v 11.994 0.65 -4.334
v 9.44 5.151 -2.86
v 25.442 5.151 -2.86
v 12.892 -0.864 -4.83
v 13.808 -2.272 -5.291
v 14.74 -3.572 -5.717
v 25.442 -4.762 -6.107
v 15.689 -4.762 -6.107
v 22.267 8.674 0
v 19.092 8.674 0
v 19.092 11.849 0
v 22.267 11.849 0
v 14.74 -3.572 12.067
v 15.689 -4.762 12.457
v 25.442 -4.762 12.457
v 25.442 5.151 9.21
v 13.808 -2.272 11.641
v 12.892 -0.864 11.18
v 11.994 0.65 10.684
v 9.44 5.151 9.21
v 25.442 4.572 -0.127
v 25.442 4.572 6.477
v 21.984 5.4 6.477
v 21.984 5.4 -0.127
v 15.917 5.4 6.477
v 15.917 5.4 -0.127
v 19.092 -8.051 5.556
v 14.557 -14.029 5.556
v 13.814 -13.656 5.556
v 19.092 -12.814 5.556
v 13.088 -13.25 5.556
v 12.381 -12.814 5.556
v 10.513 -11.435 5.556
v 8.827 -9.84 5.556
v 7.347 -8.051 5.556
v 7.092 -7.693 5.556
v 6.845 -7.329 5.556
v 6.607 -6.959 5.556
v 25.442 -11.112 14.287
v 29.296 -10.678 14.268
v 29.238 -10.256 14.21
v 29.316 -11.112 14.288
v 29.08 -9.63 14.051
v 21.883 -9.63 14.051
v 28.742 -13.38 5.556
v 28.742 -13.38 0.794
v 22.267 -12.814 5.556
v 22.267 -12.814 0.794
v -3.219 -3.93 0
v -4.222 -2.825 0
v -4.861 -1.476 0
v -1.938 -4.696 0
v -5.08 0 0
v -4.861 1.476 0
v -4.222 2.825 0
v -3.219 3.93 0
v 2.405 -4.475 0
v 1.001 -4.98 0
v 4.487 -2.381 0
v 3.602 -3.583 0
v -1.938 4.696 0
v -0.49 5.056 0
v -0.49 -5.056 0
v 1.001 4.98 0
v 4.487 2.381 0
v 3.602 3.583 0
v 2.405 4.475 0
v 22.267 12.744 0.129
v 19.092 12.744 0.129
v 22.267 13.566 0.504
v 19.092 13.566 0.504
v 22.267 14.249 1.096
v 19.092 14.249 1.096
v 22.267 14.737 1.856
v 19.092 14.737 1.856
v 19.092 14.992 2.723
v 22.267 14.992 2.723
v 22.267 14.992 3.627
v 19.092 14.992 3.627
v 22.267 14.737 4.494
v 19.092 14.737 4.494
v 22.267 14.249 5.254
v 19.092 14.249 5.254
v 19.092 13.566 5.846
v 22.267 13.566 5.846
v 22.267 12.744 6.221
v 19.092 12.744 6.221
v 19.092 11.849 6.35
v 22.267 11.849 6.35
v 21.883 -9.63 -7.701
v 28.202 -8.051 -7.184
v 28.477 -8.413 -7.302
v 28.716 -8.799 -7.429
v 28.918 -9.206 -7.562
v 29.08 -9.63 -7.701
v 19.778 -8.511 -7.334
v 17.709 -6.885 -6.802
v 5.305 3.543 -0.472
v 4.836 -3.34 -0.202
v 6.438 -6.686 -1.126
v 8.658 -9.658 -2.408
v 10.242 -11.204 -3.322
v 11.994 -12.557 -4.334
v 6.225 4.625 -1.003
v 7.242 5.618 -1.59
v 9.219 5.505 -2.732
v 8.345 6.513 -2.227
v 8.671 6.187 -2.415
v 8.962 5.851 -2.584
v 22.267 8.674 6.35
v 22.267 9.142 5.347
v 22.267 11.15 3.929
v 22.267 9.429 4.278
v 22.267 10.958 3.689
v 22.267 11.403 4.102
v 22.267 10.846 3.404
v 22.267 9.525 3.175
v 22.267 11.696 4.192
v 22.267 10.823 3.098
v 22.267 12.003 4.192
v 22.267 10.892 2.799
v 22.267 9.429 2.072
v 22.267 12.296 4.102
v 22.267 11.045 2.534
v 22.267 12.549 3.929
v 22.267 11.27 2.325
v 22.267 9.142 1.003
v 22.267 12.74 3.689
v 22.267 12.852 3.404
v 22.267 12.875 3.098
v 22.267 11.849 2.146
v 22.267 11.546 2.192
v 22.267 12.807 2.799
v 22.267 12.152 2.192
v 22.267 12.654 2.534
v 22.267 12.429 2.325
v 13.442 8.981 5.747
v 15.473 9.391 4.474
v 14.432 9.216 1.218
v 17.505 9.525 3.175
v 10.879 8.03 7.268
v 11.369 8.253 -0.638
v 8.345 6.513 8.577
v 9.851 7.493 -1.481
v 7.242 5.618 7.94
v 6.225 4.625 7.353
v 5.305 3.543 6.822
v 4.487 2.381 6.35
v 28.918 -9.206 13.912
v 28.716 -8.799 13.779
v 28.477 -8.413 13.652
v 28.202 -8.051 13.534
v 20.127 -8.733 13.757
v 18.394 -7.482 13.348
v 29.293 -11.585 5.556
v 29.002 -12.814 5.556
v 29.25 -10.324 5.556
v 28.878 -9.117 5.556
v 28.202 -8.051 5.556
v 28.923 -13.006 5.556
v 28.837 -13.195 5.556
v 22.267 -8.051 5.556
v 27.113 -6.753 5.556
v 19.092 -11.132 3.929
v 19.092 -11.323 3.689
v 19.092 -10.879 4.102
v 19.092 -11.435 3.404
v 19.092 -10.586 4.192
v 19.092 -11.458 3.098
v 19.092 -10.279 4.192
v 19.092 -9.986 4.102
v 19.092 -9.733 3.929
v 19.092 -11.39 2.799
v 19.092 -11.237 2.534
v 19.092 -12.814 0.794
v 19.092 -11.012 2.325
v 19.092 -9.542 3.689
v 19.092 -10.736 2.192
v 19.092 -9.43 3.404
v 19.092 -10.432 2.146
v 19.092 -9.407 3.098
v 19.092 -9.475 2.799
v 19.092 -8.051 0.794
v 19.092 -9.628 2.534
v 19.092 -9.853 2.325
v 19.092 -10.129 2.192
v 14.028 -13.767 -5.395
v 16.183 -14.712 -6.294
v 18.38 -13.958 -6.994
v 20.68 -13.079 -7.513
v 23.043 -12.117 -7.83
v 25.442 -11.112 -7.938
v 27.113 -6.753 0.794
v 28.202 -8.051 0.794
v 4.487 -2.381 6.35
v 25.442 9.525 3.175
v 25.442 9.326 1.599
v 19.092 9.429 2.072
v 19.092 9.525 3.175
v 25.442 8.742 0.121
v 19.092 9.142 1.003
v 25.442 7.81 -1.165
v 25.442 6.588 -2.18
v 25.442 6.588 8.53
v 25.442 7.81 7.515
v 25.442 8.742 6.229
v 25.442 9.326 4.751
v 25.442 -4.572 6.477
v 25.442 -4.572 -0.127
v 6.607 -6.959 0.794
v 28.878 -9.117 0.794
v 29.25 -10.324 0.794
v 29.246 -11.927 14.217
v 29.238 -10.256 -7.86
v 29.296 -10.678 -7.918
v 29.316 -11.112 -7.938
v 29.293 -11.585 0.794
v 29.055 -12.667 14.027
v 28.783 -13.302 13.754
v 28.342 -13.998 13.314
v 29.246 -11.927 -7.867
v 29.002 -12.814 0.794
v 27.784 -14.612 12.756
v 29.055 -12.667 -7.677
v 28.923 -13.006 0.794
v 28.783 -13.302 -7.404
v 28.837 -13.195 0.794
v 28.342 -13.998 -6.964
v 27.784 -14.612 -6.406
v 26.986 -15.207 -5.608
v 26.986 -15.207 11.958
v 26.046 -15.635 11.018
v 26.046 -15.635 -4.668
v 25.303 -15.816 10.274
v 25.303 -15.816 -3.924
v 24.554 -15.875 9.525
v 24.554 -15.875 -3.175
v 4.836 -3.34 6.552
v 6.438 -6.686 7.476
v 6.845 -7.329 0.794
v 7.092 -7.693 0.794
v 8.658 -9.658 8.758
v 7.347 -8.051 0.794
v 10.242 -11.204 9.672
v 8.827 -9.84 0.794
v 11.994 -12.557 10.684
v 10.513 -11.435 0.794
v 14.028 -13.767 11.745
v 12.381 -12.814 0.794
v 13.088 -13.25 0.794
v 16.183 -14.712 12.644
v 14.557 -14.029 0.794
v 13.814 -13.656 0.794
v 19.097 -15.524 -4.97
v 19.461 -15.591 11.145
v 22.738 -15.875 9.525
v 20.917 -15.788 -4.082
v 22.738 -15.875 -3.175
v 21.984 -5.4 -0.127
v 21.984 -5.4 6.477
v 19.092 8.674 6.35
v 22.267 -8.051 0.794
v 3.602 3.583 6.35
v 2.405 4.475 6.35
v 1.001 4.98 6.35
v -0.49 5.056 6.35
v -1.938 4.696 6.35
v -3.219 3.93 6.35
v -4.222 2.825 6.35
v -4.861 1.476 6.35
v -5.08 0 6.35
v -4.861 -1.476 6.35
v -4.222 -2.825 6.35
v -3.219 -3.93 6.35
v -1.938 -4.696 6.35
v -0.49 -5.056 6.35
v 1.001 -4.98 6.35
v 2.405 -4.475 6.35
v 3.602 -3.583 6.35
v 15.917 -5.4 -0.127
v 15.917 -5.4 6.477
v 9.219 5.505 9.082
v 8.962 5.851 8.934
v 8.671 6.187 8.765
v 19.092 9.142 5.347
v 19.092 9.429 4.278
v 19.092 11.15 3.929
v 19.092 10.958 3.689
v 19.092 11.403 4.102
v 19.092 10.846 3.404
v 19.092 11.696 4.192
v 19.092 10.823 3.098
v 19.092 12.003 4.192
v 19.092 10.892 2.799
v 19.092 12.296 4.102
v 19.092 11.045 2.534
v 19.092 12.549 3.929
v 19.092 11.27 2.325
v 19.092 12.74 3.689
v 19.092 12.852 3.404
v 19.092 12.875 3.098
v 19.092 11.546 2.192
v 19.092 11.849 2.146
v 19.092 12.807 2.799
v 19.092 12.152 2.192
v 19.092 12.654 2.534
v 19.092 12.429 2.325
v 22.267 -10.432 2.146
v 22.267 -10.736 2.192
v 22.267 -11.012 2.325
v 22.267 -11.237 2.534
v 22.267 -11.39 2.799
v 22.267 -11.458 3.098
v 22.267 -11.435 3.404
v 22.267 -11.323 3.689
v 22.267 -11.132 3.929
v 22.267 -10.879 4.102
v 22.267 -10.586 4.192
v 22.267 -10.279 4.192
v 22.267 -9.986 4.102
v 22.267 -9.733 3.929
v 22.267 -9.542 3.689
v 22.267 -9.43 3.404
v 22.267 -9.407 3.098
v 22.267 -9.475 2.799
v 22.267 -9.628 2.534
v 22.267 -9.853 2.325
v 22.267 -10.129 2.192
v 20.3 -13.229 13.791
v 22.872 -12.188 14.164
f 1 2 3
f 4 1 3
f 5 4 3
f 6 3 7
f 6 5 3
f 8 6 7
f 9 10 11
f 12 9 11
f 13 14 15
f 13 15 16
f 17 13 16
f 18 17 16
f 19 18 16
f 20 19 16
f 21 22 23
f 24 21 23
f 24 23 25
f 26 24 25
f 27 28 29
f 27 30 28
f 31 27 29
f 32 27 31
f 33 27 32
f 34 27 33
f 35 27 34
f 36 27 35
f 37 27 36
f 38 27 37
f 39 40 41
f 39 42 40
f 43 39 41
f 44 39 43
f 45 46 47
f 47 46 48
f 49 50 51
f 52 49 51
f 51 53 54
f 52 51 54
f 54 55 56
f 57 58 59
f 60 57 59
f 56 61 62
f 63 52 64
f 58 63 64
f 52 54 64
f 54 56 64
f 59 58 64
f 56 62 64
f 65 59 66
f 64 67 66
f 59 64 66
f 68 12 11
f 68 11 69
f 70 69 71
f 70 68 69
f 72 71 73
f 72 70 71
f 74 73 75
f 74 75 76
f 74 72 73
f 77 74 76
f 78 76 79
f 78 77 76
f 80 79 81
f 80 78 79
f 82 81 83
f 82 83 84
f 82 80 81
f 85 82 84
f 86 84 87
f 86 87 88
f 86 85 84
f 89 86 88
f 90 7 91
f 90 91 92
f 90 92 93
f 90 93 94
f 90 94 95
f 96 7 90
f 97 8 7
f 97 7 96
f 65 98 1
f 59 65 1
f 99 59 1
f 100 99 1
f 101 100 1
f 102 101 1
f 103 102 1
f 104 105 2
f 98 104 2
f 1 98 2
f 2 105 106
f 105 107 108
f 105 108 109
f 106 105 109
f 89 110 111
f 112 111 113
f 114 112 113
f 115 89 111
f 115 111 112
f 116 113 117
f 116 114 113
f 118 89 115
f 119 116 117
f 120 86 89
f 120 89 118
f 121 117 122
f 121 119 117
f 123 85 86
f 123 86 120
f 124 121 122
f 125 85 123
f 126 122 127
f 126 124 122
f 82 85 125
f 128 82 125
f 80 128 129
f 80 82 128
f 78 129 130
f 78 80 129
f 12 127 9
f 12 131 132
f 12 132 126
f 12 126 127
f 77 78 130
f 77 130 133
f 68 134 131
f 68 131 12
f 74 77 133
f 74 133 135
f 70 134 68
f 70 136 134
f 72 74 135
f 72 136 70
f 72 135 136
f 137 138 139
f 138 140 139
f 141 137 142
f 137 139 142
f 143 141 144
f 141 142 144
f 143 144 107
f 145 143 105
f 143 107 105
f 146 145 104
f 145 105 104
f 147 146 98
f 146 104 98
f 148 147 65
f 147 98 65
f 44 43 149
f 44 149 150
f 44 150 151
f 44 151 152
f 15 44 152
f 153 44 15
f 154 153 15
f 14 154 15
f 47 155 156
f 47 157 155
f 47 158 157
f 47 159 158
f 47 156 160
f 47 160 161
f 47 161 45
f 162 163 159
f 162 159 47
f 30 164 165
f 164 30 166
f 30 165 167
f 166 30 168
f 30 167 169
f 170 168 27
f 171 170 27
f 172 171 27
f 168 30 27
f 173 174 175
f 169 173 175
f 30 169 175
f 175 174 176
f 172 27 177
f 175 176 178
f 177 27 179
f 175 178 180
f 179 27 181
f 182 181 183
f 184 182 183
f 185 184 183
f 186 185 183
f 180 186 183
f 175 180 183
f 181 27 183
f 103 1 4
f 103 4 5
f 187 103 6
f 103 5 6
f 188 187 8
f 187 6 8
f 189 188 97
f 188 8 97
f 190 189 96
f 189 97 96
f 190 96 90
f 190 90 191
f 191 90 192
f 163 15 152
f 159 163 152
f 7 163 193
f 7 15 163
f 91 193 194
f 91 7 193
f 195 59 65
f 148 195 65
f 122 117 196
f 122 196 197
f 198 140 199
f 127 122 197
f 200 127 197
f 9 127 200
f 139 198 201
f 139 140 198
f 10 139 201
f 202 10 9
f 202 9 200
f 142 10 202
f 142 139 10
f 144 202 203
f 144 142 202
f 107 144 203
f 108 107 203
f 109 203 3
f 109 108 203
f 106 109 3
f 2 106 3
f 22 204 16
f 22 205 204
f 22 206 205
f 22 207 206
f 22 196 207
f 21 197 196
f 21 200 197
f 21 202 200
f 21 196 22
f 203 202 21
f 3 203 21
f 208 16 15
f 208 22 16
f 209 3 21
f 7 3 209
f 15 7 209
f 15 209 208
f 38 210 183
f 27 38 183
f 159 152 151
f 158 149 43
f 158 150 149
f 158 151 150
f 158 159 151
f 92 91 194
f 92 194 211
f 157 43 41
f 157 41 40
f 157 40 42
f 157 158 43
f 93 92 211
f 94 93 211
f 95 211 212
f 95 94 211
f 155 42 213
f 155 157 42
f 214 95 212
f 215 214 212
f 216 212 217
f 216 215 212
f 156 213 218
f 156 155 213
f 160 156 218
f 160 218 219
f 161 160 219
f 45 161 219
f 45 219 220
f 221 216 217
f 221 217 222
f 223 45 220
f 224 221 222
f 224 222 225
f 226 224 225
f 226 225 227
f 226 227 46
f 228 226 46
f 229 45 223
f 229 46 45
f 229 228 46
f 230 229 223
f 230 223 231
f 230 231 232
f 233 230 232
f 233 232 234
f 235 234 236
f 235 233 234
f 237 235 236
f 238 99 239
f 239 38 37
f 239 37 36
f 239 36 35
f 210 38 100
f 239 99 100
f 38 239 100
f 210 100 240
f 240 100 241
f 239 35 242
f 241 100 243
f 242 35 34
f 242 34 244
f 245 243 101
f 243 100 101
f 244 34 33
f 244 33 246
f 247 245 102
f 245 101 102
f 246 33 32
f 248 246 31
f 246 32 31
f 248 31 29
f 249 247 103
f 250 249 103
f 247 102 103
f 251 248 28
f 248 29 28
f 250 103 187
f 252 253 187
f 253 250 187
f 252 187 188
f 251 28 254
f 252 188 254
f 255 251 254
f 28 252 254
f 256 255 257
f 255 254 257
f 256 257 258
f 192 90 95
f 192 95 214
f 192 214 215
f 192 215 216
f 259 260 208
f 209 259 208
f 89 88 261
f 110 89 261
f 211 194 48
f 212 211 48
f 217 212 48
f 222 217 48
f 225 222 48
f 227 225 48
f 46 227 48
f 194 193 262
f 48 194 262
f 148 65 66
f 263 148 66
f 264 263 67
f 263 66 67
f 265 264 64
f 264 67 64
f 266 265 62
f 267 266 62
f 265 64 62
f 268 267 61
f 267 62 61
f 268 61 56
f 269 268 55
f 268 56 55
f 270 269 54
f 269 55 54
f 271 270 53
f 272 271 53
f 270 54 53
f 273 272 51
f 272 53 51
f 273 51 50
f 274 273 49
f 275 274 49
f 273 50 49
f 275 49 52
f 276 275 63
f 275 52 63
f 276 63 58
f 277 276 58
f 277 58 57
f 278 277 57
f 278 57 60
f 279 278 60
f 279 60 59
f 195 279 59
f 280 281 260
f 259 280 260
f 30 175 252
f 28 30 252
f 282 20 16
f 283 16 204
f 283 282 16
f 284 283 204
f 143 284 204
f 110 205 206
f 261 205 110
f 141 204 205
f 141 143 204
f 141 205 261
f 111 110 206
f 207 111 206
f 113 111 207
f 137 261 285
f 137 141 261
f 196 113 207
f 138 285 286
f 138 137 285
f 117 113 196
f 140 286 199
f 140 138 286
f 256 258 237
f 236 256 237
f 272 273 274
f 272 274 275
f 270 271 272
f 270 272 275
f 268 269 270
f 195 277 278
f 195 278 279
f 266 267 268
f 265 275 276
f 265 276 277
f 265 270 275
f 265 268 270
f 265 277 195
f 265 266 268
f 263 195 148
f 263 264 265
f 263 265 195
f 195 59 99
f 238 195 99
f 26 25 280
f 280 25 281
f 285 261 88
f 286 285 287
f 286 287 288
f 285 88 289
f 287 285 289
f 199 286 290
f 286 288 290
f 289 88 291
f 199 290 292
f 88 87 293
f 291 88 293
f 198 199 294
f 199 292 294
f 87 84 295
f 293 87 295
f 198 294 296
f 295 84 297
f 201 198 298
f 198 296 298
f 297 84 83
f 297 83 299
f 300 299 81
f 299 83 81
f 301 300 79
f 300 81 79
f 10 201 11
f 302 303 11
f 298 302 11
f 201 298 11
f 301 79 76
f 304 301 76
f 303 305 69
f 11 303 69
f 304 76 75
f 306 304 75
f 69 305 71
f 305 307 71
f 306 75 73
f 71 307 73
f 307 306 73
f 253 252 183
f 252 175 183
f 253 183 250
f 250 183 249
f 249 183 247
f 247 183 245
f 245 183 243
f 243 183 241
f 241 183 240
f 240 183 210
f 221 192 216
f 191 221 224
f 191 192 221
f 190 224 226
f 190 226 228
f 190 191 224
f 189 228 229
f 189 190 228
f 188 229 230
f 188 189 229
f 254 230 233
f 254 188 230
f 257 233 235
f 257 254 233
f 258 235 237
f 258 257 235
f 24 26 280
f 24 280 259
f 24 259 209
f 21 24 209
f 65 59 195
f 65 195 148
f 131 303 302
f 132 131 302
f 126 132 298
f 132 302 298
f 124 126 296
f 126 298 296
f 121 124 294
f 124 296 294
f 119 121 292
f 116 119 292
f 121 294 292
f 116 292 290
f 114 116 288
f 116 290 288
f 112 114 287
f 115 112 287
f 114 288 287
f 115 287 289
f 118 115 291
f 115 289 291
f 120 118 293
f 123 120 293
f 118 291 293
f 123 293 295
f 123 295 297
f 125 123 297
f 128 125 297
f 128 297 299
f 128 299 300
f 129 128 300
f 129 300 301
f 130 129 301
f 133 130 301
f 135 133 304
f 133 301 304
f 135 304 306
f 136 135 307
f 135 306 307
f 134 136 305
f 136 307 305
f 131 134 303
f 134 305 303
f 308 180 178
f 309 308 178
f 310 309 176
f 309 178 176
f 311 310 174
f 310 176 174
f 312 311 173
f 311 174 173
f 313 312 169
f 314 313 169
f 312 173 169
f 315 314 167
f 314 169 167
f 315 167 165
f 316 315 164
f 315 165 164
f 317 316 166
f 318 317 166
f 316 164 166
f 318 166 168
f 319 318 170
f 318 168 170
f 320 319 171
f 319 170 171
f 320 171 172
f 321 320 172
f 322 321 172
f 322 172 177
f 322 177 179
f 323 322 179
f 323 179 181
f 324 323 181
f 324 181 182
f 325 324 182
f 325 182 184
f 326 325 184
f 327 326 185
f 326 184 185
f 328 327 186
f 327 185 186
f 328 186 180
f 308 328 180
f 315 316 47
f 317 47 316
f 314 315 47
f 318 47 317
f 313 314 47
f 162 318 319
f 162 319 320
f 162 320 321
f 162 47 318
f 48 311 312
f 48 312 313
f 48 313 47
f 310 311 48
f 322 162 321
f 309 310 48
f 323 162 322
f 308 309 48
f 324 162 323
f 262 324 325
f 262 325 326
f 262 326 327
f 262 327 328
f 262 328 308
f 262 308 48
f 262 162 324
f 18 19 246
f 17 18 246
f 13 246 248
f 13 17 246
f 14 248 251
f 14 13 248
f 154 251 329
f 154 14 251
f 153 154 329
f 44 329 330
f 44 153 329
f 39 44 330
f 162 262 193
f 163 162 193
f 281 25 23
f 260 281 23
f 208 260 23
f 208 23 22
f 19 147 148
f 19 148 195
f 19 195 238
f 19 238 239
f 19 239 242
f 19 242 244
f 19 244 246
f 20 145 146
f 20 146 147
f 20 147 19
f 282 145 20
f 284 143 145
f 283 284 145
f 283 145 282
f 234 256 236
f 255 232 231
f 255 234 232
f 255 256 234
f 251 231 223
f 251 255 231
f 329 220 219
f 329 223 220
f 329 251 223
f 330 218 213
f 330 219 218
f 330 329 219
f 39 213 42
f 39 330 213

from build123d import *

# Parameters (mm, degrees)
BOSS_EXTRUDE1_DEPTH      = 6.35
BOSS_EXTRUDE2_START      = -7.9375
BOSS_EXTRUDE2_DEPTH      = 22.225
CUT_EXTRUDE1_DEPTH       = 46.365450693
CUT_EXTRUDE2_START       = -7.9375
CUT_EXTRUDE2_DEPTH       = 25.24
CUT_EXTRUDE7_DEPTH       = 10
CUT_EXTRUDE7_DEPTH_BACK  = 19.05
CUT_EXTRUDE10_DEPTH      = 10.16
CUT_EXTRUDE10_DEPTH_BACK = 17.78
CUT_EXTRUDE8_START       = 0.127
CUT_EXTRUDE8_DEPTH       = 6.604
BOSS_EXTRUDE3_START      = -3.175
BOSS_EXTRUDE3_DEPTH      = 3.175
SKETCH14_W               = 1.0287
SKETCH14_H               = 3.176
SKETCH15_W               = 4.7625
SKETCH15_H               = 4.7625
CUT_EXTRUDE15_DEPTH      = 7.048780443
CUT_EXTRUDE16_START      = -3.175
SKETCH16_W               = 4.7625
SKETCH16_H               = 4.7625
CUT_EXTRUDE16_DEPTH      = 32.52405251
SKETCH18_W               = 1.0287
SKETCH18_H               = 3.176
CUT_EXTRUDE17_DEPTH      = 4.7625


with BuildPart() as part:
    # Sketch2 → Boss-Extrude1 (new body)
    with BuildSketch(Plane.XY):
        with BuildLine():
            Line((4.487320853, -2.38125), (4.487320853, 2.38125))
            ThreePointArc((4.487320853, 2.38125), (-5.08, 0), (4.487320853, -2.38125))
        make_face()
    extrude(amount=BOSS_EXTRUDE1_DEPTH)


with BuildPart() as body_2:
    # Sketch3 → Boss-Extrude2 (new body)
    with BuildSketch(Plane.XY.offset(BOSS_EXTRUDE2_START)):
        Polygon((4.487320853, 9.525), (25.442320853, 9.525), (25.442320853, -4.7625), (34.766815504, -15.875), (25.442320853, -15.875), (4.487320853, -15.875), align=None)
    extrude(amount=BOSS_EXTRUDE2_DEPTH)

    # Sketch4 → Cut-Extrude1 (cut, through all)
    with BuildSketch(Plane(origin=(0, 9.525, 0), x_dir=(1, 0, 0), z_dir=(0, 1, 0))):
        with BuildLine():
            Line((4.487320853, -6.35), (11.994161802, -10.684076643))
            ThreePointArc((11.994161802, -10.684076643), (18.481041485, -13.371030185), (25.442320853, -14.2875))
            Line((25.442320853, -14.2875), (4.487320853, -14.2875))
            Line((4.487320853, -14.2875), (4.487320853, -6.35))
        make_face()
        with BuildLine():
            Line((4.487320853, 0), (11.994161802, 4.334076643))
            ThreePointArc((11.994161802, 4.334076643), (18.481041485, 7.021030185), (25.442320853, 7.9375))
            Line((25.442320853, 7.9375), (4.487320853, 7.9375))
            Line((4.487320853, 7.9375), (4.487320853, 0))
        make_face()
    extrude(amount=-CUT_EXTRUDE1_DEPTH, mode=Mode.SUBTRACT)

    # Sketch5 → Cut-Extrude2 (cut)
    with BuildSketch(Plane.XY.offset(CUT_EXTRUDE2_START)):
        with BuildLine():
            Line((4.487320853, -15.875), (4.487320853, -2.38125))
            Line((4.487320853, -2.38125), (4.836453379, -3.34048373))
            ThreePointArc((4.836453379, -3.34048373), (11.810966692, -12.429846444), (22.737597804, -15.875))
            Line((22.737597804, -15.875), (4.487320853, -15.875))
        make_face()
        with BuildLine():
            Line((4.487320853, 2.38125), (4.487320853, 9.525))
            Line((4.487320853, 9.525), (17.504820853, 9.525))
            ThreePointArc((17.504820853, 9.525), (10.080393765, 7.621692137), (4.487320853, 2.38125))
        make_face()
        with BuildLine():
            Line((24.553601296, -15.875), (34.766815504, -15.875))
            Line((34.766815504, -15.875), (28.201887956, -8.051224009))
            ThreePointArc((28.201887956, -8.051224009), (28.869892131, -13.125219472), (24.553601296, -15.875))
        make_face()
    extrude(amount=CUT_EXTRUDE2_DEPTH, mode=Mode.SUBTRACT)

    # Sketch7 → Cut-Extrude7 (cut, two sides: drawn at the far end of the back side and taken through both)
    with BuildSketch(Plane(origin=(25.442320853, 0, 0), x_dir=(0, 0, -1), z_dir=(1, 0, 0)).offset(-CUT_EXTRUDE7_DEPTH_BACK)):
        with BuildLine():
            ThreePointArc((-9.525, -15.875), (-12.892596049, -14.480096041), (-14.2875, -11.112499989))
            Line((-14.2875, -11.112499989), (-14.2875, -15.875))
            Line((-14.2875, -15.875), (-9.525, -15.875))
        make_face()
        with BuildLine():
            ThreePointArc((7.9375, -11.112499982), (6.542596052, -14.480096039), (3.175, -15.875))
            Line((3.175, -15.875), (7.9375, -15.875))
            Line((7.9375, -15.875), (7.9375, -11.112499982))
        make_face()
    extrude(amount=CUT_EXTRUDE7_DEPTH + CUT_EXTRUDE7_DEPTH_BACK, mode=Mode.SUBTRACT)

    # Sketch7<4> → Cut-Extrude10 (cut, two sides: drawn at the far end of the back side and taken through both)
    with BuildSketch(Plane(origin=(25.442320853, 0, 0), x_dir=(0, 0, -1), z_dir=(1, 0, 0)).offset(-CUT_EXTRUDE10_DEPTH_BACK)):
        with BuildLine():
            ThreePointArc((-9.209570672, 5.151475854), (-6.901384194, 8.316649622), (-3.175, 9.525))
            Line((-3.175, 9.525), (-14.2875, 9.525))
            Line((-14.2875, 9.525), (-14.2875, -4.7625))
            Line((-14.2875, -4.7625), (-12.456650698, -4.7625))
            Line((-12.456650698, -4.7625), (-9.209570672, 5.151475854))
        make_face()
        with BuildLine():
            Line((6.106650698, -4.7625), (7.9375, -4.7625))
            Line((7.9375, -4.7625), (7.9375, 9.525))
            Line((7.9375, 9.525), (-3.175, 9.525))
            ThreePointArc((-3.175, 9.525), (0.551384194, 8.316649622), (2.859570672, 5.151475854))
            Line((2.859570672, 5.151475854), (6.106650698, -4.7625))
        make_face()
        with BuildLine():
            ThreePointArc((7.700928004, -9.630143109), (7.877985134, -10.361942155), (7.9375, -11.112499982))
            Line((7.9375, -11.112499982), (7.9375, -4.7625))
            Line((7.9375, -4.7625), (6.106650698, -4.7625))
            Line((6.106650698, -4.7625), (7.700928004, -9.630143109))
        make_face()
        with BuildLine():
            Line((-14.050928004, -9.630143109), (-12.456650698, -4.7625))
            Line((-12.456650698, -4.7625), (-14.2875, -4.7625))
            Line((-14.2875, -4.7625), (-14.2875, -11.112499989))
            ThreePointArc((-14.2875, -11.112499989), (-14.227985135, -10.361942158), (-14.050928004, -9.630143109))
        make_face()
    extrude(amount=CUT_EXTRUDE10_DEPTH + CUT_EXTRUDE10_DEPTH_BACK, mode=Mode.SUBTRACT)

    # Sketch8 → Cut-Extrude8 (cut)
    with BuildSketch(Plane.XY.offset(6.35).offset(CUT_EXTRUDE8_START)):
        Polygon((25.442320853, -4.572), (25.442320853, 4.572), (21.984176633, 5.400477249), (15.917320853, 5.400477249), (15.917320853, -5.400477249), (21.984176633, -5.400477249), align=None)
    extrude(amount=-CUT_EXTRUDE8_DEPTH, mode=Mode.SUBTRACT)

    # Sketch12 → Boss-Extrude3 (add)
    with BuildSketch(Plane(origin=(25.442320853, 0, 0), x_dir=(0, 0, -1), z_dir=(1, 0, 0)).offset(BOSS_EXTRUDE3_START)):
        with BuildLine():
            Line((-6.35, 8.674261314), (0, 8.674261314))
            Line((0, 8.674261314), (0, 11.849261314))
            ThreePointArc((0, 11.849261314), (-3.175, 15.024261314), (-6.35, 11.849261314))
            Line((-6.35, 11.849261314), (-6.35, 8.674261314))
        make_face()
    extrude(amount=-BOSS_EXTRUDE3_DEPTH)

    # Sketch14 → #1 Clearance Hole1 (revolve, cut)
    with BuildSketch(Plane(origin=(22.267320853, 11.849261314, 3.175), x_dir=(0, 0, -1), z_dir=(0, 1, 0))):
        with Locations((0.51435, 1.588)):
            Rectangle(SKETCH14_W, SKETCH14_H)
    revolve(axis=Axis((28.617320853, 11.849261314, 3.175), (-1, 0, 0)), mode=Mode.SUBTRACT)

    # Sketch15 → Cut-Extrude15 (cut)
    with BuildSketch(Plane(origin=(29.316101296, 0, 0), x_dir=(0, 0, -1), z_dir=(1, 0, 0))):
        with Locations((-3.175, -10.432474009)):
            Rectangle(SKETCH15_W, SKETCH15_H)
    extrude(amount=-CUT_EXTRUDE15_DEPTH, mode=Mode.SUBTRACT)

    # Sketch16 → Cut-Extrude16 (cut, through all)
    with BuildSketch(Plane(origin=(22.267320853, 0, 0), x_dir=(0, 0, -1), z_dir=(1, 0, 0)).offset(CUT_EXTRUDE16_START)):
        with Locations((-3.175, -10.432474009)):
            Rectangle(SKETCH16_W, SKETCH16_H)
    extrude(amount=-CUT_EXTRUDE16_DEPTH, mode=Mode.SUBTRACT)

    # Sketch18 → #1 Clearance Hole2 (revolve, cut)
    with BuildSketch(Plane(origin=(22.267320853, -10.432474009, 3.175), x_dir=(0, 0, -1), z_dir=(0, 1, 0))):
        with Locations((0.51435, 1.588)):
            Rectangle(SKETCH18_W, SKETCH18_H)
    revolve(axis=Axis((28.617320853, -10.432474009, 3.175), (-1, 0, 0)), mode=Mode.SUBTRACT)

    # Sketch19 → Cut-Extrude17 (cut)
    with BuildSketch(Plane.XY.offset(0.79375)):
        with BuildLine():
            Line((19.092320853, -12.813724009), (14.556839931, -14.029002459))
            ThreePointArc((14.556839931, -14.029002459), (10.078161119, -11.060208562), (6.606659352, -6.958870171))
            Line((6.606659352, -6.958870171), (19.092320853, -8.051224009))
            Line((19.092320853, -8.051224009), (19.092320853, -12.813724009))
        make_face()
        with BuildLine():
            Line((22.267320853, -8.051224009), (27.112513818, -6.752958467))
            Line((27.112513818, -6.752958467), (28.201887956, -8.051224009))
            ThreePointArc((28.201887956, -8.051224009), (29.291863406, -10.632626656), (28.741581352, -13.380148407))
            Line((28.741581352, -13.380148407), (22.267320853, -12.813724009))
            Line((22.267320853, -12.813724009), (22.267320853, -8.051224009))
        make_face()
    extrude(amount=CUT_EXTRUDE17_DEPTH, mode=Mode.SUBTRACT)


solid = Compound([part.part, body_2.part])
